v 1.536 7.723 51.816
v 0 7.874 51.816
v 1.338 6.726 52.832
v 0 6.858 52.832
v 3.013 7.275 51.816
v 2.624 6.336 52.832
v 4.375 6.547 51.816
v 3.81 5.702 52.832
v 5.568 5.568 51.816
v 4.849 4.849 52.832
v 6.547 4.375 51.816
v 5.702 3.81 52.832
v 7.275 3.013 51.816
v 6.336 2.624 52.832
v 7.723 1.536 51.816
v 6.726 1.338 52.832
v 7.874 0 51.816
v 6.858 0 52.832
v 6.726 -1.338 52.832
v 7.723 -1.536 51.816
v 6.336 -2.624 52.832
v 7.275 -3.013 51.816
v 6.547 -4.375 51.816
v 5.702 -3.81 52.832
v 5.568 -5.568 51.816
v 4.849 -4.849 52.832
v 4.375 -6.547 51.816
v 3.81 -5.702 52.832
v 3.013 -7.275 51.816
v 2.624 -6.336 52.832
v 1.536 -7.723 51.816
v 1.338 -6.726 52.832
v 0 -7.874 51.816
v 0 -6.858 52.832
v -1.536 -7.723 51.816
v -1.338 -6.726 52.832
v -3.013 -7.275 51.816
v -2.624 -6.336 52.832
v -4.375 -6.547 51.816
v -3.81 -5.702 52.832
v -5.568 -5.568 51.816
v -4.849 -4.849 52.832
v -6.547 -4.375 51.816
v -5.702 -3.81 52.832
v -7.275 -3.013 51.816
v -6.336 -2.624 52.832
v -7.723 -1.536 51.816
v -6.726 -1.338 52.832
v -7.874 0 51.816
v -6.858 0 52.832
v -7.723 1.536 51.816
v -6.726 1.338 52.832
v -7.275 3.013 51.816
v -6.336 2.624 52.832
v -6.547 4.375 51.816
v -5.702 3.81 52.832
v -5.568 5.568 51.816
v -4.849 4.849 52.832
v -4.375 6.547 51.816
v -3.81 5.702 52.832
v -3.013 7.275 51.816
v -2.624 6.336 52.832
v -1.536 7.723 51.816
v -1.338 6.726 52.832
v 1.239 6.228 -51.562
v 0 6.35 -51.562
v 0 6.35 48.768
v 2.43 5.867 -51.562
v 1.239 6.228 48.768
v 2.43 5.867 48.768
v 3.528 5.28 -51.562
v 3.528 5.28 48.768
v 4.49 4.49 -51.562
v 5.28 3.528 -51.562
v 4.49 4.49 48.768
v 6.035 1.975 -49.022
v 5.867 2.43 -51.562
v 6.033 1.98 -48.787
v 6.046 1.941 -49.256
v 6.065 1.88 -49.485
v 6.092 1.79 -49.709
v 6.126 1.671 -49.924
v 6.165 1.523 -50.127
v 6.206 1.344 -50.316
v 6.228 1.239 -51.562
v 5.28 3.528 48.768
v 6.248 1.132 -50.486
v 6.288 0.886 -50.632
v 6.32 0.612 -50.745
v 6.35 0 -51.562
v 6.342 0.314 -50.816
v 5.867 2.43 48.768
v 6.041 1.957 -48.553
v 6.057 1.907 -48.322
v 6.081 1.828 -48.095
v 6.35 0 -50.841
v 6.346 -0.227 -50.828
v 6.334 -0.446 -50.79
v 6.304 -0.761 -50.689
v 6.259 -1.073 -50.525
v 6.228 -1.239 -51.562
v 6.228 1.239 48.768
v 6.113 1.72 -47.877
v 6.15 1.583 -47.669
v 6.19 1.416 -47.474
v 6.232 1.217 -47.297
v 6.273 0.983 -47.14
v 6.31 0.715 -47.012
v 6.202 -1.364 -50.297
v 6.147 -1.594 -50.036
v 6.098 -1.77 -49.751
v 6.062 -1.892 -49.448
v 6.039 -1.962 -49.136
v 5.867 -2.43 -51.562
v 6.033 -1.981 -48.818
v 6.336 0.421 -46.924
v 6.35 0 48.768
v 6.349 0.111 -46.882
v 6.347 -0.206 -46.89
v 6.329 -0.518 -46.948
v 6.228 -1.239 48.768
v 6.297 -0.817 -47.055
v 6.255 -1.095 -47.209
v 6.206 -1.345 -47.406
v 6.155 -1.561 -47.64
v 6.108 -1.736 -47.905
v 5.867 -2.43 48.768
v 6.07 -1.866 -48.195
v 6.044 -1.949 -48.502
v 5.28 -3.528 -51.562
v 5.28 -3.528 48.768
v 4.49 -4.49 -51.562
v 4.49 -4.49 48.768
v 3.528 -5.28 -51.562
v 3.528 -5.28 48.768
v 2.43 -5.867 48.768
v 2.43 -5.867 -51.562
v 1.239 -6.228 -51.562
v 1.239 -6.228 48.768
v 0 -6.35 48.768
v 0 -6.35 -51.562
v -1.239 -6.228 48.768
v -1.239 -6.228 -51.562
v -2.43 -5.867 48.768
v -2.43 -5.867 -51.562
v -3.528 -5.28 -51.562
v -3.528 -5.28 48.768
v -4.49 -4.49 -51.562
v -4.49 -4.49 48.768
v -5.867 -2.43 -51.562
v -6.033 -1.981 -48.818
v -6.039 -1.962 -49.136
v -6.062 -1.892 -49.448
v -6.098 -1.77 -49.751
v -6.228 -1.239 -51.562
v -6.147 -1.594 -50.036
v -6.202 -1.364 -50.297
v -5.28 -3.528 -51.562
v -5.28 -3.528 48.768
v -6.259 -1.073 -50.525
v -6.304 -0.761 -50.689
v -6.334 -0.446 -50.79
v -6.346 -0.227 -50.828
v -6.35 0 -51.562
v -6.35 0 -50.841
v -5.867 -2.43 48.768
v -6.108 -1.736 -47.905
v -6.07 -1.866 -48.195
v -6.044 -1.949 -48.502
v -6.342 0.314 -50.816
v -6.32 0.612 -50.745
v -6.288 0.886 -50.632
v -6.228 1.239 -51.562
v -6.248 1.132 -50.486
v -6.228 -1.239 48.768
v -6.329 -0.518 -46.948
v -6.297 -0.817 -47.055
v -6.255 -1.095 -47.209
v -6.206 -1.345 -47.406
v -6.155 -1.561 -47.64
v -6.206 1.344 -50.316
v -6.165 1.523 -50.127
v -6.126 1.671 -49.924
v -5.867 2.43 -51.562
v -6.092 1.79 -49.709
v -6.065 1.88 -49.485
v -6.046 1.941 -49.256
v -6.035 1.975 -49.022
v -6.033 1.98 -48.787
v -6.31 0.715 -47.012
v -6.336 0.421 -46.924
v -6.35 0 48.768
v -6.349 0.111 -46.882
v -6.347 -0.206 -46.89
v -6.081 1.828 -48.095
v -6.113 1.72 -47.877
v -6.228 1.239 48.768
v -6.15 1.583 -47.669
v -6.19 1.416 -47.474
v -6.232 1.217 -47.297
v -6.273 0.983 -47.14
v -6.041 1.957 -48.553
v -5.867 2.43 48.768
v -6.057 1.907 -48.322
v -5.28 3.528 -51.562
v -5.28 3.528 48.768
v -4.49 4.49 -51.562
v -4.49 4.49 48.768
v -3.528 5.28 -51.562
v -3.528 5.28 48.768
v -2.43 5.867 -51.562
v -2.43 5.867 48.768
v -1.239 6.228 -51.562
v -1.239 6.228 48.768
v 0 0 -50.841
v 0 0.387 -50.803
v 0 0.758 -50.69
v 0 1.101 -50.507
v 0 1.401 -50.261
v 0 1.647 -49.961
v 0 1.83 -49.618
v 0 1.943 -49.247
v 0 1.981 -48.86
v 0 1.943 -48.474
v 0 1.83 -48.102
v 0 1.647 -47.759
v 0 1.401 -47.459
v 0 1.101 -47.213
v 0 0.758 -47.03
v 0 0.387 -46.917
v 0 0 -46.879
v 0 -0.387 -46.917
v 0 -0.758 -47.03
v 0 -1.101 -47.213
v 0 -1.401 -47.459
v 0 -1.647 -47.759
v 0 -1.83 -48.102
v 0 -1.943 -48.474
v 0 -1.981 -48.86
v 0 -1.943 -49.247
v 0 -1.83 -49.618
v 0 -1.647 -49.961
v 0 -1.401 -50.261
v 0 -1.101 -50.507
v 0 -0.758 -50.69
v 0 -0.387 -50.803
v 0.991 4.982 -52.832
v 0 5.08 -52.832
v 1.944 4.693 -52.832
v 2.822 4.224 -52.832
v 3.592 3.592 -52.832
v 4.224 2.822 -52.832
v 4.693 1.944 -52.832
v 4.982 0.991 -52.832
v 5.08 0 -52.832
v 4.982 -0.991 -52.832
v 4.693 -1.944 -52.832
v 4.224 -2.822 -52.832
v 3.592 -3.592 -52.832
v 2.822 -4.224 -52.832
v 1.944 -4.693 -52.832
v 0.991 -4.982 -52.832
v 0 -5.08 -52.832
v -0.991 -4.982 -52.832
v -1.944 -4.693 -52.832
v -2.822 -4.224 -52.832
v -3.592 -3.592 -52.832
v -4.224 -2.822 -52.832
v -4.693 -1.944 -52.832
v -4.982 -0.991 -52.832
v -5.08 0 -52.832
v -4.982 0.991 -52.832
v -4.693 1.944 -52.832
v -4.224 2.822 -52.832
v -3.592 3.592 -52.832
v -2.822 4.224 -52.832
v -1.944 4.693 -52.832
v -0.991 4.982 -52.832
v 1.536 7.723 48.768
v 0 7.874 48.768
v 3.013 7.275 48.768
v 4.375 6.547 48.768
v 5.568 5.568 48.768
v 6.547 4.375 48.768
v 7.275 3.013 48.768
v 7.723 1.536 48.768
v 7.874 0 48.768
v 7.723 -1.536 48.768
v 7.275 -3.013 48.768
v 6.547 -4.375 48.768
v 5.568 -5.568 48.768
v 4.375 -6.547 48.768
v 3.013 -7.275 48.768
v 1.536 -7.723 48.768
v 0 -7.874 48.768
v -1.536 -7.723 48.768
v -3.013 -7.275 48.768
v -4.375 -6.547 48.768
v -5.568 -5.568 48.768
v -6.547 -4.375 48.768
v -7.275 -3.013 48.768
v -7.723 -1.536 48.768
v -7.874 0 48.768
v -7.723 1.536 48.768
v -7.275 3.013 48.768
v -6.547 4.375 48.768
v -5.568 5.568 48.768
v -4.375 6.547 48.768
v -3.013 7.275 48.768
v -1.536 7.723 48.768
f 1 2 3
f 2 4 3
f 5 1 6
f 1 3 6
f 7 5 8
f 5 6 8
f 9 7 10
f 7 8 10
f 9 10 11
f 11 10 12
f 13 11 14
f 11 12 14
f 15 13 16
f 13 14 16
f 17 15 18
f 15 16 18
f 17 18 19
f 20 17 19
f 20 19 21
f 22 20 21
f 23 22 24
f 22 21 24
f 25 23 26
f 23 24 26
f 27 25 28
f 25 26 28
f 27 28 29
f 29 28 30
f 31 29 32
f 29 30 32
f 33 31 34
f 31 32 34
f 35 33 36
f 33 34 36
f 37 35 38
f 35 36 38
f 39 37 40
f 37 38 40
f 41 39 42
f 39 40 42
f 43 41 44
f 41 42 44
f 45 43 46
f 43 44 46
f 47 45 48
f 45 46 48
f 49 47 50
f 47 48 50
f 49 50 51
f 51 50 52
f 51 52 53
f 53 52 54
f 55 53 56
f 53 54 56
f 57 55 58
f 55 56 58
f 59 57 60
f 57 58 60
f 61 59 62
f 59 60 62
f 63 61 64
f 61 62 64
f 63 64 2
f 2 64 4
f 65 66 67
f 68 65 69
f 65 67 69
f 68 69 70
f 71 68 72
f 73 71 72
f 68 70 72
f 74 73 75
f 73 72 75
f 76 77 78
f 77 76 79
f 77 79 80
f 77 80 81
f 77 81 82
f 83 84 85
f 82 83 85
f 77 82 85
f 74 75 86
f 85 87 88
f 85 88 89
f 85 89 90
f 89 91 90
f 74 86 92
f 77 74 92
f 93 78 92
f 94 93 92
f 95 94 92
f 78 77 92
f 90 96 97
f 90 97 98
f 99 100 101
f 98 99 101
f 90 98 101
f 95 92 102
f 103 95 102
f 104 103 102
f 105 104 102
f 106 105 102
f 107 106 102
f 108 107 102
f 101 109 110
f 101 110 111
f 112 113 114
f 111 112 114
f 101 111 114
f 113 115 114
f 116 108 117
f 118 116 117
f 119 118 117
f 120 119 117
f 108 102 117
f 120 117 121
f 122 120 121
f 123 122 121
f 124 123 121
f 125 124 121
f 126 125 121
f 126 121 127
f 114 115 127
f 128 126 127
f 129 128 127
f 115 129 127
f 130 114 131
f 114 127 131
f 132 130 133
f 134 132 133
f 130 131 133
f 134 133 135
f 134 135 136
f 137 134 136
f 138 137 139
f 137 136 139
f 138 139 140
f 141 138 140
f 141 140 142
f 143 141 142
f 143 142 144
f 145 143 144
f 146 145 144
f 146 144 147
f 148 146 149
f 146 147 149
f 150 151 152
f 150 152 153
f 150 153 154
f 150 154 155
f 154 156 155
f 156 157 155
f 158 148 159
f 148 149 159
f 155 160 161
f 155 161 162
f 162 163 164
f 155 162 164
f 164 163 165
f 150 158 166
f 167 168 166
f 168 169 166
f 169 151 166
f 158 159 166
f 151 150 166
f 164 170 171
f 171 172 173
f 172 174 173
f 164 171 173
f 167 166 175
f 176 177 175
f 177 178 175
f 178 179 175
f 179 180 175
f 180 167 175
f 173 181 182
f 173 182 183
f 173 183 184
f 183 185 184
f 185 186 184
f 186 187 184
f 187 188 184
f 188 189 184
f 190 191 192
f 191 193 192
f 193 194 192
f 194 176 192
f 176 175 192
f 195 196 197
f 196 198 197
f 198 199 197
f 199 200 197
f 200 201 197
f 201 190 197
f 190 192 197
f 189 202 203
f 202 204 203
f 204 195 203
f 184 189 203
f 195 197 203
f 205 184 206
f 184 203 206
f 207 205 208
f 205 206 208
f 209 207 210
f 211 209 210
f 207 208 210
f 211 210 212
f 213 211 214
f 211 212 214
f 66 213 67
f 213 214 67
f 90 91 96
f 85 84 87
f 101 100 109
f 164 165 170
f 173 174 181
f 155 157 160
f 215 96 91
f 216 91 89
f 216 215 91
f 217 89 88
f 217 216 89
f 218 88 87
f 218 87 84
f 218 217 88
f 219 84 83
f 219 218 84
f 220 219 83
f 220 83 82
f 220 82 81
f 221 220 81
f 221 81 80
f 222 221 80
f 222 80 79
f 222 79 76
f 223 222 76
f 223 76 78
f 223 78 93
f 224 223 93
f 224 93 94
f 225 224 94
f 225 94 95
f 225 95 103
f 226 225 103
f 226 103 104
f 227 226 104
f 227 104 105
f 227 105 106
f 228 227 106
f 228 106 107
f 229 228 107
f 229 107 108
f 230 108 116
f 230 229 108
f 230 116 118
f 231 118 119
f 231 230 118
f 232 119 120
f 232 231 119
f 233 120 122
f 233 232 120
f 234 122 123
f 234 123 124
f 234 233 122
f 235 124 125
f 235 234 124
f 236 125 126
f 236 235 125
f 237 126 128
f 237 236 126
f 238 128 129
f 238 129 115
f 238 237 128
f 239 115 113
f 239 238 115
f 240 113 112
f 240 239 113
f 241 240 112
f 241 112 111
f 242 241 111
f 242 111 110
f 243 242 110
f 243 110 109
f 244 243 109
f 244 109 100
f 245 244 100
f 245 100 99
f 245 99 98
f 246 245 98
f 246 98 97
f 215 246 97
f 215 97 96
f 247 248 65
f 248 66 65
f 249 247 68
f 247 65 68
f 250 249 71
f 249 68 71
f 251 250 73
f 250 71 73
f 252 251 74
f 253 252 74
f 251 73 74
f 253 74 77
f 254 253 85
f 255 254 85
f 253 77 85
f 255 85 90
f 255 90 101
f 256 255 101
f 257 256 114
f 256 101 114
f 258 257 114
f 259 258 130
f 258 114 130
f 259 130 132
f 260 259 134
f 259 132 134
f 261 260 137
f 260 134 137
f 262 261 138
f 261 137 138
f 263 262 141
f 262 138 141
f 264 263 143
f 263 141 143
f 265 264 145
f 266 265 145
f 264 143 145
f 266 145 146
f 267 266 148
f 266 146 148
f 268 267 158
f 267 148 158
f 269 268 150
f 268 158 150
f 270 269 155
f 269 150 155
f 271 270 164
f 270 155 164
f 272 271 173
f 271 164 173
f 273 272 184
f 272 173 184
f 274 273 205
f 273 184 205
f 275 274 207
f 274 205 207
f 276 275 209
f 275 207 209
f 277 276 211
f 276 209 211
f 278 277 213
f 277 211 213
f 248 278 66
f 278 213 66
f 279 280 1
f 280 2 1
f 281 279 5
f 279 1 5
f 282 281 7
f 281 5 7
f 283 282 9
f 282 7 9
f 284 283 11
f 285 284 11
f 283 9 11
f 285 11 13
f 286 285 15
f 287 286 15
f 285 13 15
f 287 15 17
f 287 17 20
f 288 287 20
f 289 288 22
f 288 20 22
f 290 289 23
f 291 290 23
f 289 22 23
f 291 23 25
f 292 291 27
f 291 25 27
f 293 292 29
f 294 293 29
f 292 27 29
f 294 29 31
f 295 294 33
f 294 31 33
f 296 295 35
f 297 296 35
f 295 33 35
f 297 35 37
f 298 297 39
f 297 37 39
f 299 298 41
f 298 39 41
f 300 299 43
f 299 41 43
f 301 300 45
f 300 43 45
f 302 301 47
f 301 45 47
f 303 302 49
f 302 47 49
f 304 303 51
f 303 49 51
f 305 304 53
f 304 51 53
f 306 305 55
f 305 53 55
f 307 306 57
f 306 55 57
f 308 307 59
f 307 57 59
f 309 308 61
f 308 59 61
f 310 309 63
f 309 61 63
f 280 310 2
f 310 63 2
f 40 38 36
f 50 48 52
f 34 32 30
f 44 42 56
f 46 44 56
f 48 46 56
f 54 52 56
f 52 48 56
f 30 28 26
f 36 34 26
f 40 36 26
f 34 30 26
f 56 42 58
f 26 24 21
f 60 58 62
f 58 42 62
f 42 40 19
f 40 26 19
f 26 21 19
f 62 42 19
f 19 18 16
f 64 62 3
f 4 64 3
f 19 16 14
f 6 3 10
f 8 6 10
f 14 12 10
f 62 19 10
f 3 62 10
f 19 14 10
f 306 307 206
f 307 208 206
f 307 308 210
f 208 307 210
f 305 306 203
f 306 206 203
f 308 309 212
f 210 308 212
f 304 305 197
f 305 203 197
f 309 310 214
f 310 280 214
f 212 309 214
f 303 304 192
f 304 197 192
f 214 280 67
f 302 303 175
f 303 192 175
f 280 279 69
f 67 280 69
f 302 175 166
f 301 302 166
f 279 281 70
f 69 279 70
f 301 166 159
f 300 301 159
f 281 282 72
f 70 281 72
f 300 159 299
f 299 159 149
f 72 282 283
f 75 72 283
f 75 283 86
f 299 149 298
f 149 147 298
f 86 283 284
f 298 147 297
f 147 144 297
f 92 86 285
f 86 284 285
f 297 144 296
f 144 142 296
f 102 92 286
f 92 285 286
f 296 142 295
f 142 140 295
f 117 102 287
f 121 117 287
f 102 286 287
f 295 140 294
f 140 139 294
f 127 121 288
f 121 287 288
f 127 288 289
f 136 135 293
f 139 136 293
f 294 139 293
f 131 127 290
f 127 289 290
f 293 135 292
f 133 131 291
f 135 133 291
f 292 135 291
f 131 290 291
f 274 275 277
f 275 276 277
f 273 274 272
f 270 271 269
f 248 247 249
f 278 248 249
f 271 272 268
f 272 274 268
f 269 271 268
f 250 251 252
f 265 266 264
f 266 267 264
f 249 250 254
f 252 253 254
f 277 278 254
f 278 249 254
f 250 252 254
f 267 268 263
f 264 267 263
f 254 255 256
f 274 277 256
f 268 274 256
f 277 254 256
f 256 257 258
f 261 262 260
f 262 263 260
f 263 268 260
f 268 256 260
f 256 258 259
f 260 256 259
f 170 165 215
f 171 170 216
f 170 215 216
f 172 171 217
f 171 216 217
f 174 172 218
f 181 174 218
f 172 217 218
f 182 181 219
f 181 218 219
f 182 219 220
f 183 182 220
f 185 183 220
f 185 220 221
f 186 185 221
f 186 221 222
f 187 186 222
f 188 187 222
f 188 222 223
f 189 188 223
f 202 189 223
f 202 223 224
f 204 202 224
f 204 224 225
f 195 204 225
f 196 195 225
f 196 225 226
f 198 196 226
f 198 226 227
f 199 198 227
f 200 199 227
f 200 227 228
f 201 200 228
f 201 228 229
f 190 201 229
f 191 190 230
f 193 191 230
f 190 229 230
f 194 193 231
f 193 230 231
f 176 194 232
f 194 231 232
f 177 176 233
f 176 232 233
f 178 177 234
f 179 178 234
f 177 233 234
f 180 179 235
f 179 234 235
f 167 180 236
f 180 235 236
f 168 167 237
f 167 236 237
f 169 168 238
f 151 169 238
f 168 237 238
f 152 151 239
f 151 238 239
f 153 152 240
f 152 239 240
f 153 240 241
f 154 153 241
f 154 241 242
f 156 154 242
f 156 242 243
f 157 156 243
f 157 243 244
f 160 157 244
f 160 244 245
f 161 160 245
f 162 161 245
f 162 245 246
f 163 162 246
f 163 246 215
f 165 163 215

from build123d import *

# Parameters (mm, degrees)
SKETCH3_R               = 1.9812
CUT_EXTRUDE1_DEPTH      = 8.874
CUT_EXTRUDE1_DEPTH_BACK = 8.874


with BuildPart() as part:
    # Sketch2 → Revolve1 (revolve)
    with BuildSketch(Plane(origin=(0, 0, 0), x_dir=(0, 0, -1), z_dir=(1, 0, 0))):
        Polygon((51.562, 6.35), (-48.768, 6.35), (-48.768, 7.874), (-51.816, 7.874), (-52.832, 6.858), (-52.832, 0), (52.832, 0), (52.832, 5.08), align=None)
    revolve(axis=Axis((0, 0, 52.832), (0, 0, -1)))

    # Sketch3 → Cut-Extrude1 (cut, two sides)
    with BuildSketch(Plane(origin=(0, 0, 0), x_dir=(0, 0, -1), z_dir=(1, 0, 0))) as cut_extrude1_sk:
        with Locations((48.860075, 0)):
            Circle(SKETCH3_R)
    extrude(amount=CUT_EXTRUDE1_DEPTH, mode=Mode.SUBTRACT)
    extrude(cut_extrude1_sk.sketch, amount=-CUT_EXTRUDE1_DEPTH_BACK, mode=Mode.SUBTRACT)


solid = part.part
